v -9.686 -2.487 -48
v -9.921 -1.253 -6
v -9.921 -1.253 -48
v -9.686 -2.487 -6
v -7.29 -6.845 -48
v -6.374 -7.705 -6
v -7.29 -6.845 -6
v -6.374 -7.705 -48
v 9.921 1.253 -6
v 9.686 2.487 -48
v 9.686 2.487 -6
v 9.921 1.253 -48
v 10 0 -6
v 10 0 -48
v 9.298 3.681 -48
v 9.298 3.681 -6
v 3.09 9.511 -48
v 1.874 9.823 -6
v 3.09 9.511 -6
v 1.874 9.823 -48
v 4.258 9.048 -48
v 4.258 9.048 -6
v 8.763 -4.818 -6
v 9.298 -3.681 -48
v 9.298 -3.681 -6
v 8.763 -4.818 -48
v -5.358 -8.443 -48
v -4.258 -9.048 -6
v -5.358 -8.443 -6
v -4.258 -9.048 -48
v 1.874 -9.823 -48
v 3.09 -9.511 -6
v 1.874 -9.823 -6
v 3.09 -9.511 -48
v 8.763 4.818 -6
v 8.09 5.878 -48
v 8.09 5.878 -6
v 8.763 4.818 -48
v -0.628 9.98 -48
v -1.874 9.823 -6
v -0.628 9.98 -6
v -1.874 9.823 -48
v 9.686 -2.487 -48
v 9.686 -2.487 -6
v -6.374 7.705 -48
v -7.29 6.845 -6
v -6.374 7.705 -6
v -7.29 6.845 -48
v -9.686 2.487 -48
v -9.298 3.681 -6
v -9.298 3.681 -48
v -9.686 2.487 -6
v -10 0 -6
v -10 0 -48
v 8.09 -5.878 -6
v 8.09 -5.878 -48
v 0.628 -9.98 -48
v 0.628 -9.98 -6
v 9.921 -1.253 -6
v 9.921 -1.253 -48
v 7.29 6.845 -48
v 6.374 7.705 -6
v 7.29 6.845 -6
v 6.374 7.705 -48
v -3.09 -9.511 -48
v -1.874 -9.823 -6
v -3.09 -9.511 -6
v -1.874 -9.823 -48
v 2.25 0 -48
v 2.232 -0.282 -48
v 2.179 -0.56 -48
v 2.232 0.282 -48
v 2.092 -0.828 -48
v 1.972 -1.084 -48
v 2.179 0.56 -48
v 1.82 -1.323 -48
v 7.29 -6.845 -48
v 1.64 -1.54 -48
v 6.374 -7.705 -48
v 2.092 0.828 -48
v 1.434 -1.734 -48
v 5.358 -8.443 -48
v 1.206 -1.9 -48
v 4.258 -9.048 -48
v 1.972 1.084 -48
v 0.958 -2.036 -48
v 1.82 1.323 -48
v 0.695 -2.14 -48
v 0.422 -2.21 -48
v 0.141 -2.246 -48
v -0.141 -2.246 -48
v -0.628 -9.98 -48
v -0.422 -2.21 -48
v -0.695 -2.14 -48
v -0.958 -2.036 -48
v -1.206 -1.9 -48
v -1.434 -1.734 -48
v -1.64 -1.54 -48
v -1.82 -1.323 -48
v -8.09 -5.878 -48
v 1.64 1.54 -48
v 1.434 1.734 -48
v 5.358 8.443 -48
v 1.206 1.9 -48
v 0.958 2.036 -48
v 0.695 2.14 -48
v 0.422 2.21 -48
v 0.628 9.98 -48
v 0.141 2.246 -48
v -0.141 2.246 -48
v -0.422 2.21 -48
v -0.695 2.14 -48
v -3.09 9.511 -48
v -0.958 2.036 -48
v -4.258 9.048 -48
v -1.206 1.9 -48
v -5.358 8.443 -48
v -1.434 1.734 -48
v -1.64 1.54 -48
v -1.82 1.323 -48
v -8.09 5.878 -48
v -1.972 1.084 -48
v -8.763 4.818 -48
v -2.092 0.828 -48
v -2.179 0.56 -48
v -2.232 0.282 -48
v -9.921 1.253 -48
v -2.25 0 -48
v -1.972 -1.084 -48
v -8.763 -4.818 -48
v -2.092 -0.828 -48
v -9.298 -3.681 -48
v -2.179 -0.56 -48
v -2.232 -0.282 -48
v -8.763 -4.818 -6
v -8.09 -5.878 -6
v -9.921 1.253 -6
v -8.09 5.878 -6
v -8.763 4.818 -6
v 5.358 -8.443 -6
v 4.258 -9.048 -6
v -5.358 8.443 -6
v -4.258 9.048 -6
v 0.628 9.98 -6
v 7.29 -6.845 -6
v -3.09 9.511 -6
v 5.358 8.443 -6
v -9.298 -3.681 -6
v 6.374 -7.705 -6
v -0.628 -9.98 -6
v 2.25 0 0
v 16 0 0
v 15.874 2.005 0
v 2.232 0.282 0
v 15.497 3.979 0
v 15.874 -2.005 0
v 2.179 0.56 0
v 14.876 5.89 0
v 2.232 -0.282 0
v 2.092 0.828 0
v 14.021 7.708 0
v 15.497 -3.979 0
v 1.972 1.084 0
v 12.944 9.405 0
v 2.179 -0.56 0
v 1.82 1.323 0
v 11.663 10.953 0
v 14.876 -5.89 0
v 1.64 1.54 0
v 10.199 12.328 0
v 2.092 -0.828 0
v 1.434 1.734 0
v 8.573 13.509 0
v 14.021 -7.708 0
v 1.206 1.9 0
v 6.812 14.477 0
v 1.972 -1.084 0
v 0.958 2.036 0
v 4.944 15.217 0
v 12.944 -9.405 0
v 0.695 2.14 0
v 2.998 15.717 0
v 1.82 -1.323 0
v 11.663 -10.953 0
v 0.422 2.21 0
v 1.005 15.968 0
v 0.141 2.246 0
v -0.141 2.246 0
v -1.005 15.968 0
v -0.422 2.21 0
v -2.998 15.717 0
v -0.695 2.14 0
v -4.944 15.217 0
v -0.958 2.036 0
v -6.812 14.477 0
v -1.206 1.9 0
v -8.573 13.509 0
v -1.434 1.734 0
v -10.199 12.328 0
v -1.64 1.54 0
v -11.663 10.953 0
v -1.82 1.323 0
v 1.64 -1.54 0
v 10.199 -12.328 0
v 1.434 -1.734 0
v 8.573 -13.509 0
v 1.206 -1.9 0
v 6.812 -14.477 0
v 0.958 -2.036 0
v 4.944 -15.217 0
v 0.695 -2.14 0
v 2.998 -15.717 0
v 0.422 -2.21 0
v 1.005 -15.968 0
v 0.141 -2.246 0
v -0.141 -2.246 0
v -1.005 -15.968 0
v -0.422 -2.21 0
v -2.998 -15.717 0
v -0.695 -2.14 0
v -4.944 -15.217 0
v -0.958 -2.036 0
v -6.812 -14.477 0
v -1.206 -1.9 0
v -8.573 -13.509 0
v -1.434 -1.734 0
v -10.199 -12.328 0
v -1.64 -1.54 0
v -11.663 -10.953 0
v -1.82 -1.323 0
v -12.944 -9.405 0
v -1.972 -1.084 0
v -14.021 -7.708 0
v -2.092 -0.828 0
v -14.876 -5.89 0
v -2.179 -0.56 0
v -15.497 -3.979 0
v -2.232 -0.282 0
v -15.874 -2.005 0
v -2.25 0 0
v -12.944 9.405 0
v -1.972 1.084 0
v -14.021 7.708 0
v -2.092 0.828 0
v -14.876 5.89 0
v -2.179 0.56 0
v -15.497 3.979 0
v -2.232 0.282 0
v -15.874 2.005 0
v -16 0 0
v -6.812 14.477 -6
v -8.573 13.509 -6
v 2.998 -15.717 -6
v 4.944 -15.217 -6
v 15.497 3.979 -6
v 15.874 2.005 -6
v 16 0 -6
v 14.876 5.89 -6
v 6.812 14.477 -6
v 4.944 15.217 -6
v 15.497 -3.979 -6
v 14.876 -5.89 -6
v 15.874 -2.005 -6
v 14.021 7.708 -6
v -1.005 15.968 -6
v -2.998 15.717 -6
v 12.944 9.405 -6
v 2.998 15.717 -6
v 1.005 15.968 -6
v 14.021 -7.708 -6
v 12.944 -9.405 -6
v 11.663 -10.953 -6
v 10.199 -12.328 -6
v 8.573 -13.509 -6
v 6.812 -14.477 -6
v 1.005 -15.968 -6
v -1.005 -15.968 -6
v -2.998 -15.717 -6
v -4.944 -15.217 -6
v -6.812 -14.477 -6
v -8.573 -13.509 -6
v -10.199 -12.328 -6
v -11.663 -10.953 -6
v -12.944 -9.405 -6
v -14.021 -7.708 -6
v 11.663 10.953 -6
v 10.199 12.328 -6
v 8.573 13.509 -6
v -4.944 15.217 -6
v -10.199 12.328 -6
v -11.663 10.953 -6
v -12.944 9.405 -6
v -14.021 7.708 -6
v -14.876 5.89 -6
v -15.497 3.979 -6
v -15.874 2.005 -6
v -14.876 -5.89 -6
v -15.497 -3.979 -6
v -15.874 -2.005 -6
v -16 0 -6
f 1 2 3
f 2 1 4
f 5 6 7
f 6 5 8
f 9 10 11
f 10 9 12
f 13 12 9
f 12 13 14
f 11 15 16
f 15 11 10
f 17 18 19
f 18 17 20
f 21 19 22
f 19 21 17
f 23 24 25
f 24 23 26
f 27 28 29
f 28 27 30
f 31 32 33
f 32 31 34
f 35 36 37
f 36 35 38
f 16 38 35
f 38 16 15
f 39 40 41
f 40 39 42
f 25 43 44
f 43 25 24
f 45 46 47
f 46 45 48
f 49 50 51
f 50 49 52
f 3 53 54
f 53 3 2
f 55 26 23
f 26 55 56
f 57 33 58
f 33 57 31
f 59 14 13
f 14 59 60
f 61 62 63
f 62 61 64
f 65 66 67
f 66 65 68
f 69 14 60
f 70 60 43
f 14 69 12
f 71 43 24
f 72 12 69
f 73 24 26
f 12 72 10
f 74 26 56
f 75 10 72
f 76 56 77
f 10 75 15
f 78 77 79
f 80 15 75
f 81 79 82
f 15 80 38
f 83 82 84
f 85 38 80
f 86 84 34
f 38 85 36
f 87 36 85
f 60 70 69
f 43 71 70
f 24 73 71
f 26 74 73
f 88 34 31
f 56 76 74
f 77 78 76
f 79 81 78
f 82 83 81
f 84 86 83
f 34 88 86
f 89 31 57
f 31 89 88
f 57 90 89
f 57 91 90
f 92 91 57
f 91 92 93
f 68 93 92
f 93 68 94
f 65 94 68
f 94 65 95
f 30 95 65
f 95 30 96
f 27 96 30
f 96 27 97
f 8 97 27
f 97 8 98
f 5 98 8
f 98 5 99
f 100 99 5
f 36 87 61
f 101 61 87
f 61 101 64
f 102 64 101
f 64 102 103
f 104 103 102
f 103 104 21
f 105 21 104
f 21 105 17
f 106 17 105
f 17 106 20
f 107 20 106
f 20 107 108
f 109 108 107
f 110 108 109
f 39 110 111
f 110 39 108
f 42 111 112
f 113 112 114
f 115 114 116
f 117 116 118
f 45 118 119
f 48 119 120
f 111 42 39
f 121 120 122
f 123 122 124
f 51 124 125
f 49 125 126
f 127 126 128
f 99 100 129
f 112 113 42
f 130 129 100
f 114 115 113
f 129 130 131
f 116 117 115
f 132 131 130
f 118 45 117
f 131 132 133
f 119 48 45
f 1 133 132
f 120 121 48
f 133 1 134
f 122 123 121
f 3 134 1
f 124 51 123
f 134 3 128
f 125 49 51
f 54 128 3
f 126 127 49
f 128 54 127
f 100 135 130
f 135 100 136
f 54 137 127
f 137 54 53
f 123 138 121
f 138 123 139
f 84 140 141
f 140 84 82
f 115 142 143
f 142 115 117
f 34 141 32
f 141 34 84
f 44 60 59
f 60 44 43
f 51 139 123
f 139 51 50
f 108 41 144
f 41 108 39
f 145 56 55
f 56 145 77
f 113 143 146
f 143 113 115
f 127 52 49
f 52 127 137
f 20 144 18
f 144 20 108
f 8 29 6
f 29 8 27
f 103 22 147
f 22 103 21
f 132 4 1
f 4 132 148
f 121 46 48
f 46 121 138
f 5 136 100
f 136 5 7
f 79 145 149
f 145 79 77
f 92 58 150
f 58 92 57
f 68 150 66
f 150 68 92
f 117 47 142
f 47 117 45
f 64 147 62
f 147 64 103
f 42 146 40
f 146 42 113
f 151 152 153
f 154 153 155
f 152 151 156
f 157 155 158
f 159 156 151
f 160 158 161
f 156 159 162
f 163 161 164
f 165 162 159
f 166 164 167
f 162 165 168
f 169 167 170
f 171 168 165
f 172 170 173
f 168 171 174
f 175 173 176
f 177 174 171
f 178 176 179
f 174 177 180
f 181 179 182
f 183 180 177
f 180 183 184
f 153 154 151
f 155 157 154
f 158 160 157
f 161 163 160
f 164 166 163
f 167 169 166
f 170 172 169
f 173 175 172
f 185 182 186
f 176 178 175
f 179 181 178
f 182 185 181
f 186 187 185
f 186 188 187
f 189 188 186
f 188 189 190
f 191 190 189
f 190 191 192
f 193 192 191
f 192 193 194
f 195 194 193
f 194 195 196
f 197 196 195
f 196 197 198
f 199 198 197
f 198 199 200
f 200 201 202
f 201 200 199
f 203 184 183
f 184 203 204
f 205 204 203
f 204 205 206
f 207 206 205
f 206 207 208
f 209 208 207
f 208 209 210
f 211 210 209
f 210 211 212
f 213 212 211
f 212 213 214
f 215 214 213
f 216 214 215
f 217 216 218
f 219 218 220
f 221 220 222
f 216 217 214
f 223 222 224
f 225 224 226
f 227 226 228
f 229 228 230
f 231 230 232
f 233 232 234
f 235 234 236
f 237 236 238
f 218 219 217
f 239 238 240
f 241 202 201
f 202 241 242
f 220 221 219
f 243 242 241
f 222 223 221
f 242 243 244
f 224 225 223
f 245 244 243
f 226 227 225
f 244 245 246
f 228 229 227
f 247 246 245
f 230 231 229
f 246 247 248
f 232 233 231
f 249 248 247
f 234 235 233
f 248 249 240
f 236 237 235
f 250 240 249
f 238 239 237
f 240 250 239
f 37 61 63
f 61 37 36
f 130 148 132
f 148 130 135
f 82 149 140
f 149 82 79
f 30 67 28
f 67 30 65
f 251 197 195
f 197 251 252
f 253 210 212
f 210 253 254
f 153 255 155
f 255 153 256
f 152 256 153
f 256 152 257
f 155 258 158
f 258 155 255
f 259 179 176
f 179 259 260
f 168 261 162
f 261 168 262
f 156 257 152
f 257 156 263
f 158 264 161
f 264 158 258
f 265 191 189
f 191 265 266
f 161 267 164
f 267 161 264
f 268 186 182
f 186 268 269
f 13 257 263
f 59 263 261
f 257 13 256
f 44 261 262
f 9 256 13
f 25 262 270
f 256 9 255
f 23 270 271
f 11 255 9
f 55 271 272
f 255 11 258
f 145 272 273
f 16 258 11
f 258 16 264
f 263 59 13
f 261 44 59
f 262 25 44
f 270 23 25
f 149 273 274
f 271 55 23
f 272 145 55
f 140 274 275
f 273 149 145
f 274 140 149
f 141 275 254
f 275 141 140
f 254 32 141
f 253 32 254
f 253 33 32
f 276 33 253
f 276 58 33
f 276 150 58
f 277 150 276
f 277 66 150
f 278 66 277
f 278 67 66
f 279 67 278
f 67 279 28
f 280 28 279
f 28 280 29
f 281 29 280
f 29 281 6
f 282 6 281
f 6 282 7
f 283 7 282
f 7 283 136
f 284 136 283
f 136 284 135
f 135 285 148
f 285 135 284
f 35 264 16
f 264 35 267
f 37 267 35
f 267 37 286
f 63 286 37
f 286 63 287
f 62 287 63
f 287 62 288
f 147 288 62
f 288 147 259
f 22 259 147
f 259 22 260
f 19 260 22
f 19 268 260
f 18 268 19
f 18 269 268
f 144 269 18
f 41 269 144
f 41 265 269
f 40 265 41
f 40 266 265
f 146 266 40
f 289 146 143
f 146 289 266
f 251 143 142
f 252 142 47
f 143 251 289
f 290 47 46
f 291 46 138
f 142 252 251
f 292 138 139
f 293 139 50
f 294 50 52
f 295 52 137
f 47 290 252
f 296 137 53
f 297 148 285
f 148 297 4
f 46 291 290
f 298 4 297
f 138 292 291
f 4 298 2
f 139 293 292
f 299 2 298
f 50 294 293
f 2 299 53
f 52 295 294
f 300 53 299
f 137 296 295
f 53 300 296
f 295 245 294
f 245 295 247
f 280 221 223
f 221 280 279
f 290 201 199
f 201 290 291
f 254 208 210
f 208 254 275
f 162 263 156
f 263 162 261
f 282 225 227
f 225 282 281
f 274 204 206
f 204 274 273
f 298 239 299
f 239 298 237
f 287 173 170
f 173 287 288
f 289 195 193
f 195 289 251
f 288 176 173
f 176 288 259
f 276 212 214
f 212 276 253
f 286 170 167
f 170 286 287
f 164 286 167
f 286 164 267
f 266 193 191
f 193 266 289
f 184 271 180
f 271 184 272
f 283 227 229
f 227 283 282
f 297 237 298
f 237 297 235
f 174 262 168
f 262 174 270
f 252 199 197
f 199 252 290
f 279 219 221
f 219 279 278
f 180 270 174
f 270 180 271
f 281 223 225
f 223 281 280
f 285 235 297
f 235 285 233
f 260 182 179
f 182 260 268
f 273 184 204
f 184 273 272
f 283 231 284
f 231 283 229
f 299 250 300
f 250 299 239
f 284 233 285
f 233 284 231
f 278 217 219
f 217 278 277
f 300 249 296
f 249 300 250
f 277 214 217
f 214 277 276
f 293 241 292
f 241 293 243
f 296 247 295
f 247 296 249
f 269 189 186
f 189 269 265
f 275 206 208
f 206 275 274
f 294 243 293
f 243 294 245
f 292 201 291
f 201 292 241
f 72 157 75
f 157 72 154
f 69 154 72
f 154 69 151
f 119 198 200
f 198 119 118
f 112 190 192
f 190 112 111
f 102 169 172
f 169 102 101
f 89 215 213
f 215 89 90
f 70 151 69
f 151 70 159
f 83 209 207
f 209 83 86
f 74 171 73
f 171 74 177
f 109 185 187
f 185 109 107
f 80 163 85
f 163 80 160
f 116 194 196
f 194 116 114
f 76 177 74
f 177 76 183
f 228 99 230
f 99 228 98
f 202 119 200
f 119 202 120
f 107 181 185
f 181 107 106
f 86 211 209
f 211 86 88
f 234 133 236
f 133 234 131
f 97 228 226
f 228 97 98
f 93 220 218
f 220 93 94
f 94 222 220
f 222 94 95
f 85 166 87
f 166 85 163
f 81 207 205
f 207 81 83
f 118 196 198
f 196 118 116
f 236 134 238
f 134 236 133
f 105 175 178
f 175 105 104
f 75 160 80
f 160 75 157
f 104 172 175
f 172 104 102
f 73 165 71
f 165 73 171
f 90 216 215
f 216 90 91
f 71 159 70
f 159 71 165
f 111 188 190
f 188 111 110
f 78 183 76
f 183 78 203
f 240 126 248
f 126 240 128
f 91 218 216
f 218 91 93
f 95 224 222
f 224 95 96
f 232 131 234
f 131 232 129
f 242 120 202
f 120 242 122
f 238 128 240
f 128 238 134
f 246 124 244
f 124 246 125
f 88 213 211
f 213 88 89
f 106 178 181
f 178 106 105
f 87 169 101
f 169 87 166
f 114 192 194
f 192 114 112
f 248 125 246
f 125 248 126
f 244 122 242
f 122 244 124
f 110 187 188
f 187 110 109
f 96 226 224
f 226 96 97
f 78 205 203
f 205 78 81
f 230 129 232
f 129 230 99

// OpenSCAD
$fn = 50;


difference() {
	union() {
		translate(v = [0, 0, -48.0000000000]) {
			cylinder(h = 48, r = 10.0000000000);
		}
		translate(v = [0, 0, -6.0000000000]) {
			cylinder(h = 6, r = 16.0000000000);
		}
	}
	union() {
		#translate(v = [0, 0, -48]) {
			cylinder(h = 48, r = 2.2500000000);
		}
	}
}
